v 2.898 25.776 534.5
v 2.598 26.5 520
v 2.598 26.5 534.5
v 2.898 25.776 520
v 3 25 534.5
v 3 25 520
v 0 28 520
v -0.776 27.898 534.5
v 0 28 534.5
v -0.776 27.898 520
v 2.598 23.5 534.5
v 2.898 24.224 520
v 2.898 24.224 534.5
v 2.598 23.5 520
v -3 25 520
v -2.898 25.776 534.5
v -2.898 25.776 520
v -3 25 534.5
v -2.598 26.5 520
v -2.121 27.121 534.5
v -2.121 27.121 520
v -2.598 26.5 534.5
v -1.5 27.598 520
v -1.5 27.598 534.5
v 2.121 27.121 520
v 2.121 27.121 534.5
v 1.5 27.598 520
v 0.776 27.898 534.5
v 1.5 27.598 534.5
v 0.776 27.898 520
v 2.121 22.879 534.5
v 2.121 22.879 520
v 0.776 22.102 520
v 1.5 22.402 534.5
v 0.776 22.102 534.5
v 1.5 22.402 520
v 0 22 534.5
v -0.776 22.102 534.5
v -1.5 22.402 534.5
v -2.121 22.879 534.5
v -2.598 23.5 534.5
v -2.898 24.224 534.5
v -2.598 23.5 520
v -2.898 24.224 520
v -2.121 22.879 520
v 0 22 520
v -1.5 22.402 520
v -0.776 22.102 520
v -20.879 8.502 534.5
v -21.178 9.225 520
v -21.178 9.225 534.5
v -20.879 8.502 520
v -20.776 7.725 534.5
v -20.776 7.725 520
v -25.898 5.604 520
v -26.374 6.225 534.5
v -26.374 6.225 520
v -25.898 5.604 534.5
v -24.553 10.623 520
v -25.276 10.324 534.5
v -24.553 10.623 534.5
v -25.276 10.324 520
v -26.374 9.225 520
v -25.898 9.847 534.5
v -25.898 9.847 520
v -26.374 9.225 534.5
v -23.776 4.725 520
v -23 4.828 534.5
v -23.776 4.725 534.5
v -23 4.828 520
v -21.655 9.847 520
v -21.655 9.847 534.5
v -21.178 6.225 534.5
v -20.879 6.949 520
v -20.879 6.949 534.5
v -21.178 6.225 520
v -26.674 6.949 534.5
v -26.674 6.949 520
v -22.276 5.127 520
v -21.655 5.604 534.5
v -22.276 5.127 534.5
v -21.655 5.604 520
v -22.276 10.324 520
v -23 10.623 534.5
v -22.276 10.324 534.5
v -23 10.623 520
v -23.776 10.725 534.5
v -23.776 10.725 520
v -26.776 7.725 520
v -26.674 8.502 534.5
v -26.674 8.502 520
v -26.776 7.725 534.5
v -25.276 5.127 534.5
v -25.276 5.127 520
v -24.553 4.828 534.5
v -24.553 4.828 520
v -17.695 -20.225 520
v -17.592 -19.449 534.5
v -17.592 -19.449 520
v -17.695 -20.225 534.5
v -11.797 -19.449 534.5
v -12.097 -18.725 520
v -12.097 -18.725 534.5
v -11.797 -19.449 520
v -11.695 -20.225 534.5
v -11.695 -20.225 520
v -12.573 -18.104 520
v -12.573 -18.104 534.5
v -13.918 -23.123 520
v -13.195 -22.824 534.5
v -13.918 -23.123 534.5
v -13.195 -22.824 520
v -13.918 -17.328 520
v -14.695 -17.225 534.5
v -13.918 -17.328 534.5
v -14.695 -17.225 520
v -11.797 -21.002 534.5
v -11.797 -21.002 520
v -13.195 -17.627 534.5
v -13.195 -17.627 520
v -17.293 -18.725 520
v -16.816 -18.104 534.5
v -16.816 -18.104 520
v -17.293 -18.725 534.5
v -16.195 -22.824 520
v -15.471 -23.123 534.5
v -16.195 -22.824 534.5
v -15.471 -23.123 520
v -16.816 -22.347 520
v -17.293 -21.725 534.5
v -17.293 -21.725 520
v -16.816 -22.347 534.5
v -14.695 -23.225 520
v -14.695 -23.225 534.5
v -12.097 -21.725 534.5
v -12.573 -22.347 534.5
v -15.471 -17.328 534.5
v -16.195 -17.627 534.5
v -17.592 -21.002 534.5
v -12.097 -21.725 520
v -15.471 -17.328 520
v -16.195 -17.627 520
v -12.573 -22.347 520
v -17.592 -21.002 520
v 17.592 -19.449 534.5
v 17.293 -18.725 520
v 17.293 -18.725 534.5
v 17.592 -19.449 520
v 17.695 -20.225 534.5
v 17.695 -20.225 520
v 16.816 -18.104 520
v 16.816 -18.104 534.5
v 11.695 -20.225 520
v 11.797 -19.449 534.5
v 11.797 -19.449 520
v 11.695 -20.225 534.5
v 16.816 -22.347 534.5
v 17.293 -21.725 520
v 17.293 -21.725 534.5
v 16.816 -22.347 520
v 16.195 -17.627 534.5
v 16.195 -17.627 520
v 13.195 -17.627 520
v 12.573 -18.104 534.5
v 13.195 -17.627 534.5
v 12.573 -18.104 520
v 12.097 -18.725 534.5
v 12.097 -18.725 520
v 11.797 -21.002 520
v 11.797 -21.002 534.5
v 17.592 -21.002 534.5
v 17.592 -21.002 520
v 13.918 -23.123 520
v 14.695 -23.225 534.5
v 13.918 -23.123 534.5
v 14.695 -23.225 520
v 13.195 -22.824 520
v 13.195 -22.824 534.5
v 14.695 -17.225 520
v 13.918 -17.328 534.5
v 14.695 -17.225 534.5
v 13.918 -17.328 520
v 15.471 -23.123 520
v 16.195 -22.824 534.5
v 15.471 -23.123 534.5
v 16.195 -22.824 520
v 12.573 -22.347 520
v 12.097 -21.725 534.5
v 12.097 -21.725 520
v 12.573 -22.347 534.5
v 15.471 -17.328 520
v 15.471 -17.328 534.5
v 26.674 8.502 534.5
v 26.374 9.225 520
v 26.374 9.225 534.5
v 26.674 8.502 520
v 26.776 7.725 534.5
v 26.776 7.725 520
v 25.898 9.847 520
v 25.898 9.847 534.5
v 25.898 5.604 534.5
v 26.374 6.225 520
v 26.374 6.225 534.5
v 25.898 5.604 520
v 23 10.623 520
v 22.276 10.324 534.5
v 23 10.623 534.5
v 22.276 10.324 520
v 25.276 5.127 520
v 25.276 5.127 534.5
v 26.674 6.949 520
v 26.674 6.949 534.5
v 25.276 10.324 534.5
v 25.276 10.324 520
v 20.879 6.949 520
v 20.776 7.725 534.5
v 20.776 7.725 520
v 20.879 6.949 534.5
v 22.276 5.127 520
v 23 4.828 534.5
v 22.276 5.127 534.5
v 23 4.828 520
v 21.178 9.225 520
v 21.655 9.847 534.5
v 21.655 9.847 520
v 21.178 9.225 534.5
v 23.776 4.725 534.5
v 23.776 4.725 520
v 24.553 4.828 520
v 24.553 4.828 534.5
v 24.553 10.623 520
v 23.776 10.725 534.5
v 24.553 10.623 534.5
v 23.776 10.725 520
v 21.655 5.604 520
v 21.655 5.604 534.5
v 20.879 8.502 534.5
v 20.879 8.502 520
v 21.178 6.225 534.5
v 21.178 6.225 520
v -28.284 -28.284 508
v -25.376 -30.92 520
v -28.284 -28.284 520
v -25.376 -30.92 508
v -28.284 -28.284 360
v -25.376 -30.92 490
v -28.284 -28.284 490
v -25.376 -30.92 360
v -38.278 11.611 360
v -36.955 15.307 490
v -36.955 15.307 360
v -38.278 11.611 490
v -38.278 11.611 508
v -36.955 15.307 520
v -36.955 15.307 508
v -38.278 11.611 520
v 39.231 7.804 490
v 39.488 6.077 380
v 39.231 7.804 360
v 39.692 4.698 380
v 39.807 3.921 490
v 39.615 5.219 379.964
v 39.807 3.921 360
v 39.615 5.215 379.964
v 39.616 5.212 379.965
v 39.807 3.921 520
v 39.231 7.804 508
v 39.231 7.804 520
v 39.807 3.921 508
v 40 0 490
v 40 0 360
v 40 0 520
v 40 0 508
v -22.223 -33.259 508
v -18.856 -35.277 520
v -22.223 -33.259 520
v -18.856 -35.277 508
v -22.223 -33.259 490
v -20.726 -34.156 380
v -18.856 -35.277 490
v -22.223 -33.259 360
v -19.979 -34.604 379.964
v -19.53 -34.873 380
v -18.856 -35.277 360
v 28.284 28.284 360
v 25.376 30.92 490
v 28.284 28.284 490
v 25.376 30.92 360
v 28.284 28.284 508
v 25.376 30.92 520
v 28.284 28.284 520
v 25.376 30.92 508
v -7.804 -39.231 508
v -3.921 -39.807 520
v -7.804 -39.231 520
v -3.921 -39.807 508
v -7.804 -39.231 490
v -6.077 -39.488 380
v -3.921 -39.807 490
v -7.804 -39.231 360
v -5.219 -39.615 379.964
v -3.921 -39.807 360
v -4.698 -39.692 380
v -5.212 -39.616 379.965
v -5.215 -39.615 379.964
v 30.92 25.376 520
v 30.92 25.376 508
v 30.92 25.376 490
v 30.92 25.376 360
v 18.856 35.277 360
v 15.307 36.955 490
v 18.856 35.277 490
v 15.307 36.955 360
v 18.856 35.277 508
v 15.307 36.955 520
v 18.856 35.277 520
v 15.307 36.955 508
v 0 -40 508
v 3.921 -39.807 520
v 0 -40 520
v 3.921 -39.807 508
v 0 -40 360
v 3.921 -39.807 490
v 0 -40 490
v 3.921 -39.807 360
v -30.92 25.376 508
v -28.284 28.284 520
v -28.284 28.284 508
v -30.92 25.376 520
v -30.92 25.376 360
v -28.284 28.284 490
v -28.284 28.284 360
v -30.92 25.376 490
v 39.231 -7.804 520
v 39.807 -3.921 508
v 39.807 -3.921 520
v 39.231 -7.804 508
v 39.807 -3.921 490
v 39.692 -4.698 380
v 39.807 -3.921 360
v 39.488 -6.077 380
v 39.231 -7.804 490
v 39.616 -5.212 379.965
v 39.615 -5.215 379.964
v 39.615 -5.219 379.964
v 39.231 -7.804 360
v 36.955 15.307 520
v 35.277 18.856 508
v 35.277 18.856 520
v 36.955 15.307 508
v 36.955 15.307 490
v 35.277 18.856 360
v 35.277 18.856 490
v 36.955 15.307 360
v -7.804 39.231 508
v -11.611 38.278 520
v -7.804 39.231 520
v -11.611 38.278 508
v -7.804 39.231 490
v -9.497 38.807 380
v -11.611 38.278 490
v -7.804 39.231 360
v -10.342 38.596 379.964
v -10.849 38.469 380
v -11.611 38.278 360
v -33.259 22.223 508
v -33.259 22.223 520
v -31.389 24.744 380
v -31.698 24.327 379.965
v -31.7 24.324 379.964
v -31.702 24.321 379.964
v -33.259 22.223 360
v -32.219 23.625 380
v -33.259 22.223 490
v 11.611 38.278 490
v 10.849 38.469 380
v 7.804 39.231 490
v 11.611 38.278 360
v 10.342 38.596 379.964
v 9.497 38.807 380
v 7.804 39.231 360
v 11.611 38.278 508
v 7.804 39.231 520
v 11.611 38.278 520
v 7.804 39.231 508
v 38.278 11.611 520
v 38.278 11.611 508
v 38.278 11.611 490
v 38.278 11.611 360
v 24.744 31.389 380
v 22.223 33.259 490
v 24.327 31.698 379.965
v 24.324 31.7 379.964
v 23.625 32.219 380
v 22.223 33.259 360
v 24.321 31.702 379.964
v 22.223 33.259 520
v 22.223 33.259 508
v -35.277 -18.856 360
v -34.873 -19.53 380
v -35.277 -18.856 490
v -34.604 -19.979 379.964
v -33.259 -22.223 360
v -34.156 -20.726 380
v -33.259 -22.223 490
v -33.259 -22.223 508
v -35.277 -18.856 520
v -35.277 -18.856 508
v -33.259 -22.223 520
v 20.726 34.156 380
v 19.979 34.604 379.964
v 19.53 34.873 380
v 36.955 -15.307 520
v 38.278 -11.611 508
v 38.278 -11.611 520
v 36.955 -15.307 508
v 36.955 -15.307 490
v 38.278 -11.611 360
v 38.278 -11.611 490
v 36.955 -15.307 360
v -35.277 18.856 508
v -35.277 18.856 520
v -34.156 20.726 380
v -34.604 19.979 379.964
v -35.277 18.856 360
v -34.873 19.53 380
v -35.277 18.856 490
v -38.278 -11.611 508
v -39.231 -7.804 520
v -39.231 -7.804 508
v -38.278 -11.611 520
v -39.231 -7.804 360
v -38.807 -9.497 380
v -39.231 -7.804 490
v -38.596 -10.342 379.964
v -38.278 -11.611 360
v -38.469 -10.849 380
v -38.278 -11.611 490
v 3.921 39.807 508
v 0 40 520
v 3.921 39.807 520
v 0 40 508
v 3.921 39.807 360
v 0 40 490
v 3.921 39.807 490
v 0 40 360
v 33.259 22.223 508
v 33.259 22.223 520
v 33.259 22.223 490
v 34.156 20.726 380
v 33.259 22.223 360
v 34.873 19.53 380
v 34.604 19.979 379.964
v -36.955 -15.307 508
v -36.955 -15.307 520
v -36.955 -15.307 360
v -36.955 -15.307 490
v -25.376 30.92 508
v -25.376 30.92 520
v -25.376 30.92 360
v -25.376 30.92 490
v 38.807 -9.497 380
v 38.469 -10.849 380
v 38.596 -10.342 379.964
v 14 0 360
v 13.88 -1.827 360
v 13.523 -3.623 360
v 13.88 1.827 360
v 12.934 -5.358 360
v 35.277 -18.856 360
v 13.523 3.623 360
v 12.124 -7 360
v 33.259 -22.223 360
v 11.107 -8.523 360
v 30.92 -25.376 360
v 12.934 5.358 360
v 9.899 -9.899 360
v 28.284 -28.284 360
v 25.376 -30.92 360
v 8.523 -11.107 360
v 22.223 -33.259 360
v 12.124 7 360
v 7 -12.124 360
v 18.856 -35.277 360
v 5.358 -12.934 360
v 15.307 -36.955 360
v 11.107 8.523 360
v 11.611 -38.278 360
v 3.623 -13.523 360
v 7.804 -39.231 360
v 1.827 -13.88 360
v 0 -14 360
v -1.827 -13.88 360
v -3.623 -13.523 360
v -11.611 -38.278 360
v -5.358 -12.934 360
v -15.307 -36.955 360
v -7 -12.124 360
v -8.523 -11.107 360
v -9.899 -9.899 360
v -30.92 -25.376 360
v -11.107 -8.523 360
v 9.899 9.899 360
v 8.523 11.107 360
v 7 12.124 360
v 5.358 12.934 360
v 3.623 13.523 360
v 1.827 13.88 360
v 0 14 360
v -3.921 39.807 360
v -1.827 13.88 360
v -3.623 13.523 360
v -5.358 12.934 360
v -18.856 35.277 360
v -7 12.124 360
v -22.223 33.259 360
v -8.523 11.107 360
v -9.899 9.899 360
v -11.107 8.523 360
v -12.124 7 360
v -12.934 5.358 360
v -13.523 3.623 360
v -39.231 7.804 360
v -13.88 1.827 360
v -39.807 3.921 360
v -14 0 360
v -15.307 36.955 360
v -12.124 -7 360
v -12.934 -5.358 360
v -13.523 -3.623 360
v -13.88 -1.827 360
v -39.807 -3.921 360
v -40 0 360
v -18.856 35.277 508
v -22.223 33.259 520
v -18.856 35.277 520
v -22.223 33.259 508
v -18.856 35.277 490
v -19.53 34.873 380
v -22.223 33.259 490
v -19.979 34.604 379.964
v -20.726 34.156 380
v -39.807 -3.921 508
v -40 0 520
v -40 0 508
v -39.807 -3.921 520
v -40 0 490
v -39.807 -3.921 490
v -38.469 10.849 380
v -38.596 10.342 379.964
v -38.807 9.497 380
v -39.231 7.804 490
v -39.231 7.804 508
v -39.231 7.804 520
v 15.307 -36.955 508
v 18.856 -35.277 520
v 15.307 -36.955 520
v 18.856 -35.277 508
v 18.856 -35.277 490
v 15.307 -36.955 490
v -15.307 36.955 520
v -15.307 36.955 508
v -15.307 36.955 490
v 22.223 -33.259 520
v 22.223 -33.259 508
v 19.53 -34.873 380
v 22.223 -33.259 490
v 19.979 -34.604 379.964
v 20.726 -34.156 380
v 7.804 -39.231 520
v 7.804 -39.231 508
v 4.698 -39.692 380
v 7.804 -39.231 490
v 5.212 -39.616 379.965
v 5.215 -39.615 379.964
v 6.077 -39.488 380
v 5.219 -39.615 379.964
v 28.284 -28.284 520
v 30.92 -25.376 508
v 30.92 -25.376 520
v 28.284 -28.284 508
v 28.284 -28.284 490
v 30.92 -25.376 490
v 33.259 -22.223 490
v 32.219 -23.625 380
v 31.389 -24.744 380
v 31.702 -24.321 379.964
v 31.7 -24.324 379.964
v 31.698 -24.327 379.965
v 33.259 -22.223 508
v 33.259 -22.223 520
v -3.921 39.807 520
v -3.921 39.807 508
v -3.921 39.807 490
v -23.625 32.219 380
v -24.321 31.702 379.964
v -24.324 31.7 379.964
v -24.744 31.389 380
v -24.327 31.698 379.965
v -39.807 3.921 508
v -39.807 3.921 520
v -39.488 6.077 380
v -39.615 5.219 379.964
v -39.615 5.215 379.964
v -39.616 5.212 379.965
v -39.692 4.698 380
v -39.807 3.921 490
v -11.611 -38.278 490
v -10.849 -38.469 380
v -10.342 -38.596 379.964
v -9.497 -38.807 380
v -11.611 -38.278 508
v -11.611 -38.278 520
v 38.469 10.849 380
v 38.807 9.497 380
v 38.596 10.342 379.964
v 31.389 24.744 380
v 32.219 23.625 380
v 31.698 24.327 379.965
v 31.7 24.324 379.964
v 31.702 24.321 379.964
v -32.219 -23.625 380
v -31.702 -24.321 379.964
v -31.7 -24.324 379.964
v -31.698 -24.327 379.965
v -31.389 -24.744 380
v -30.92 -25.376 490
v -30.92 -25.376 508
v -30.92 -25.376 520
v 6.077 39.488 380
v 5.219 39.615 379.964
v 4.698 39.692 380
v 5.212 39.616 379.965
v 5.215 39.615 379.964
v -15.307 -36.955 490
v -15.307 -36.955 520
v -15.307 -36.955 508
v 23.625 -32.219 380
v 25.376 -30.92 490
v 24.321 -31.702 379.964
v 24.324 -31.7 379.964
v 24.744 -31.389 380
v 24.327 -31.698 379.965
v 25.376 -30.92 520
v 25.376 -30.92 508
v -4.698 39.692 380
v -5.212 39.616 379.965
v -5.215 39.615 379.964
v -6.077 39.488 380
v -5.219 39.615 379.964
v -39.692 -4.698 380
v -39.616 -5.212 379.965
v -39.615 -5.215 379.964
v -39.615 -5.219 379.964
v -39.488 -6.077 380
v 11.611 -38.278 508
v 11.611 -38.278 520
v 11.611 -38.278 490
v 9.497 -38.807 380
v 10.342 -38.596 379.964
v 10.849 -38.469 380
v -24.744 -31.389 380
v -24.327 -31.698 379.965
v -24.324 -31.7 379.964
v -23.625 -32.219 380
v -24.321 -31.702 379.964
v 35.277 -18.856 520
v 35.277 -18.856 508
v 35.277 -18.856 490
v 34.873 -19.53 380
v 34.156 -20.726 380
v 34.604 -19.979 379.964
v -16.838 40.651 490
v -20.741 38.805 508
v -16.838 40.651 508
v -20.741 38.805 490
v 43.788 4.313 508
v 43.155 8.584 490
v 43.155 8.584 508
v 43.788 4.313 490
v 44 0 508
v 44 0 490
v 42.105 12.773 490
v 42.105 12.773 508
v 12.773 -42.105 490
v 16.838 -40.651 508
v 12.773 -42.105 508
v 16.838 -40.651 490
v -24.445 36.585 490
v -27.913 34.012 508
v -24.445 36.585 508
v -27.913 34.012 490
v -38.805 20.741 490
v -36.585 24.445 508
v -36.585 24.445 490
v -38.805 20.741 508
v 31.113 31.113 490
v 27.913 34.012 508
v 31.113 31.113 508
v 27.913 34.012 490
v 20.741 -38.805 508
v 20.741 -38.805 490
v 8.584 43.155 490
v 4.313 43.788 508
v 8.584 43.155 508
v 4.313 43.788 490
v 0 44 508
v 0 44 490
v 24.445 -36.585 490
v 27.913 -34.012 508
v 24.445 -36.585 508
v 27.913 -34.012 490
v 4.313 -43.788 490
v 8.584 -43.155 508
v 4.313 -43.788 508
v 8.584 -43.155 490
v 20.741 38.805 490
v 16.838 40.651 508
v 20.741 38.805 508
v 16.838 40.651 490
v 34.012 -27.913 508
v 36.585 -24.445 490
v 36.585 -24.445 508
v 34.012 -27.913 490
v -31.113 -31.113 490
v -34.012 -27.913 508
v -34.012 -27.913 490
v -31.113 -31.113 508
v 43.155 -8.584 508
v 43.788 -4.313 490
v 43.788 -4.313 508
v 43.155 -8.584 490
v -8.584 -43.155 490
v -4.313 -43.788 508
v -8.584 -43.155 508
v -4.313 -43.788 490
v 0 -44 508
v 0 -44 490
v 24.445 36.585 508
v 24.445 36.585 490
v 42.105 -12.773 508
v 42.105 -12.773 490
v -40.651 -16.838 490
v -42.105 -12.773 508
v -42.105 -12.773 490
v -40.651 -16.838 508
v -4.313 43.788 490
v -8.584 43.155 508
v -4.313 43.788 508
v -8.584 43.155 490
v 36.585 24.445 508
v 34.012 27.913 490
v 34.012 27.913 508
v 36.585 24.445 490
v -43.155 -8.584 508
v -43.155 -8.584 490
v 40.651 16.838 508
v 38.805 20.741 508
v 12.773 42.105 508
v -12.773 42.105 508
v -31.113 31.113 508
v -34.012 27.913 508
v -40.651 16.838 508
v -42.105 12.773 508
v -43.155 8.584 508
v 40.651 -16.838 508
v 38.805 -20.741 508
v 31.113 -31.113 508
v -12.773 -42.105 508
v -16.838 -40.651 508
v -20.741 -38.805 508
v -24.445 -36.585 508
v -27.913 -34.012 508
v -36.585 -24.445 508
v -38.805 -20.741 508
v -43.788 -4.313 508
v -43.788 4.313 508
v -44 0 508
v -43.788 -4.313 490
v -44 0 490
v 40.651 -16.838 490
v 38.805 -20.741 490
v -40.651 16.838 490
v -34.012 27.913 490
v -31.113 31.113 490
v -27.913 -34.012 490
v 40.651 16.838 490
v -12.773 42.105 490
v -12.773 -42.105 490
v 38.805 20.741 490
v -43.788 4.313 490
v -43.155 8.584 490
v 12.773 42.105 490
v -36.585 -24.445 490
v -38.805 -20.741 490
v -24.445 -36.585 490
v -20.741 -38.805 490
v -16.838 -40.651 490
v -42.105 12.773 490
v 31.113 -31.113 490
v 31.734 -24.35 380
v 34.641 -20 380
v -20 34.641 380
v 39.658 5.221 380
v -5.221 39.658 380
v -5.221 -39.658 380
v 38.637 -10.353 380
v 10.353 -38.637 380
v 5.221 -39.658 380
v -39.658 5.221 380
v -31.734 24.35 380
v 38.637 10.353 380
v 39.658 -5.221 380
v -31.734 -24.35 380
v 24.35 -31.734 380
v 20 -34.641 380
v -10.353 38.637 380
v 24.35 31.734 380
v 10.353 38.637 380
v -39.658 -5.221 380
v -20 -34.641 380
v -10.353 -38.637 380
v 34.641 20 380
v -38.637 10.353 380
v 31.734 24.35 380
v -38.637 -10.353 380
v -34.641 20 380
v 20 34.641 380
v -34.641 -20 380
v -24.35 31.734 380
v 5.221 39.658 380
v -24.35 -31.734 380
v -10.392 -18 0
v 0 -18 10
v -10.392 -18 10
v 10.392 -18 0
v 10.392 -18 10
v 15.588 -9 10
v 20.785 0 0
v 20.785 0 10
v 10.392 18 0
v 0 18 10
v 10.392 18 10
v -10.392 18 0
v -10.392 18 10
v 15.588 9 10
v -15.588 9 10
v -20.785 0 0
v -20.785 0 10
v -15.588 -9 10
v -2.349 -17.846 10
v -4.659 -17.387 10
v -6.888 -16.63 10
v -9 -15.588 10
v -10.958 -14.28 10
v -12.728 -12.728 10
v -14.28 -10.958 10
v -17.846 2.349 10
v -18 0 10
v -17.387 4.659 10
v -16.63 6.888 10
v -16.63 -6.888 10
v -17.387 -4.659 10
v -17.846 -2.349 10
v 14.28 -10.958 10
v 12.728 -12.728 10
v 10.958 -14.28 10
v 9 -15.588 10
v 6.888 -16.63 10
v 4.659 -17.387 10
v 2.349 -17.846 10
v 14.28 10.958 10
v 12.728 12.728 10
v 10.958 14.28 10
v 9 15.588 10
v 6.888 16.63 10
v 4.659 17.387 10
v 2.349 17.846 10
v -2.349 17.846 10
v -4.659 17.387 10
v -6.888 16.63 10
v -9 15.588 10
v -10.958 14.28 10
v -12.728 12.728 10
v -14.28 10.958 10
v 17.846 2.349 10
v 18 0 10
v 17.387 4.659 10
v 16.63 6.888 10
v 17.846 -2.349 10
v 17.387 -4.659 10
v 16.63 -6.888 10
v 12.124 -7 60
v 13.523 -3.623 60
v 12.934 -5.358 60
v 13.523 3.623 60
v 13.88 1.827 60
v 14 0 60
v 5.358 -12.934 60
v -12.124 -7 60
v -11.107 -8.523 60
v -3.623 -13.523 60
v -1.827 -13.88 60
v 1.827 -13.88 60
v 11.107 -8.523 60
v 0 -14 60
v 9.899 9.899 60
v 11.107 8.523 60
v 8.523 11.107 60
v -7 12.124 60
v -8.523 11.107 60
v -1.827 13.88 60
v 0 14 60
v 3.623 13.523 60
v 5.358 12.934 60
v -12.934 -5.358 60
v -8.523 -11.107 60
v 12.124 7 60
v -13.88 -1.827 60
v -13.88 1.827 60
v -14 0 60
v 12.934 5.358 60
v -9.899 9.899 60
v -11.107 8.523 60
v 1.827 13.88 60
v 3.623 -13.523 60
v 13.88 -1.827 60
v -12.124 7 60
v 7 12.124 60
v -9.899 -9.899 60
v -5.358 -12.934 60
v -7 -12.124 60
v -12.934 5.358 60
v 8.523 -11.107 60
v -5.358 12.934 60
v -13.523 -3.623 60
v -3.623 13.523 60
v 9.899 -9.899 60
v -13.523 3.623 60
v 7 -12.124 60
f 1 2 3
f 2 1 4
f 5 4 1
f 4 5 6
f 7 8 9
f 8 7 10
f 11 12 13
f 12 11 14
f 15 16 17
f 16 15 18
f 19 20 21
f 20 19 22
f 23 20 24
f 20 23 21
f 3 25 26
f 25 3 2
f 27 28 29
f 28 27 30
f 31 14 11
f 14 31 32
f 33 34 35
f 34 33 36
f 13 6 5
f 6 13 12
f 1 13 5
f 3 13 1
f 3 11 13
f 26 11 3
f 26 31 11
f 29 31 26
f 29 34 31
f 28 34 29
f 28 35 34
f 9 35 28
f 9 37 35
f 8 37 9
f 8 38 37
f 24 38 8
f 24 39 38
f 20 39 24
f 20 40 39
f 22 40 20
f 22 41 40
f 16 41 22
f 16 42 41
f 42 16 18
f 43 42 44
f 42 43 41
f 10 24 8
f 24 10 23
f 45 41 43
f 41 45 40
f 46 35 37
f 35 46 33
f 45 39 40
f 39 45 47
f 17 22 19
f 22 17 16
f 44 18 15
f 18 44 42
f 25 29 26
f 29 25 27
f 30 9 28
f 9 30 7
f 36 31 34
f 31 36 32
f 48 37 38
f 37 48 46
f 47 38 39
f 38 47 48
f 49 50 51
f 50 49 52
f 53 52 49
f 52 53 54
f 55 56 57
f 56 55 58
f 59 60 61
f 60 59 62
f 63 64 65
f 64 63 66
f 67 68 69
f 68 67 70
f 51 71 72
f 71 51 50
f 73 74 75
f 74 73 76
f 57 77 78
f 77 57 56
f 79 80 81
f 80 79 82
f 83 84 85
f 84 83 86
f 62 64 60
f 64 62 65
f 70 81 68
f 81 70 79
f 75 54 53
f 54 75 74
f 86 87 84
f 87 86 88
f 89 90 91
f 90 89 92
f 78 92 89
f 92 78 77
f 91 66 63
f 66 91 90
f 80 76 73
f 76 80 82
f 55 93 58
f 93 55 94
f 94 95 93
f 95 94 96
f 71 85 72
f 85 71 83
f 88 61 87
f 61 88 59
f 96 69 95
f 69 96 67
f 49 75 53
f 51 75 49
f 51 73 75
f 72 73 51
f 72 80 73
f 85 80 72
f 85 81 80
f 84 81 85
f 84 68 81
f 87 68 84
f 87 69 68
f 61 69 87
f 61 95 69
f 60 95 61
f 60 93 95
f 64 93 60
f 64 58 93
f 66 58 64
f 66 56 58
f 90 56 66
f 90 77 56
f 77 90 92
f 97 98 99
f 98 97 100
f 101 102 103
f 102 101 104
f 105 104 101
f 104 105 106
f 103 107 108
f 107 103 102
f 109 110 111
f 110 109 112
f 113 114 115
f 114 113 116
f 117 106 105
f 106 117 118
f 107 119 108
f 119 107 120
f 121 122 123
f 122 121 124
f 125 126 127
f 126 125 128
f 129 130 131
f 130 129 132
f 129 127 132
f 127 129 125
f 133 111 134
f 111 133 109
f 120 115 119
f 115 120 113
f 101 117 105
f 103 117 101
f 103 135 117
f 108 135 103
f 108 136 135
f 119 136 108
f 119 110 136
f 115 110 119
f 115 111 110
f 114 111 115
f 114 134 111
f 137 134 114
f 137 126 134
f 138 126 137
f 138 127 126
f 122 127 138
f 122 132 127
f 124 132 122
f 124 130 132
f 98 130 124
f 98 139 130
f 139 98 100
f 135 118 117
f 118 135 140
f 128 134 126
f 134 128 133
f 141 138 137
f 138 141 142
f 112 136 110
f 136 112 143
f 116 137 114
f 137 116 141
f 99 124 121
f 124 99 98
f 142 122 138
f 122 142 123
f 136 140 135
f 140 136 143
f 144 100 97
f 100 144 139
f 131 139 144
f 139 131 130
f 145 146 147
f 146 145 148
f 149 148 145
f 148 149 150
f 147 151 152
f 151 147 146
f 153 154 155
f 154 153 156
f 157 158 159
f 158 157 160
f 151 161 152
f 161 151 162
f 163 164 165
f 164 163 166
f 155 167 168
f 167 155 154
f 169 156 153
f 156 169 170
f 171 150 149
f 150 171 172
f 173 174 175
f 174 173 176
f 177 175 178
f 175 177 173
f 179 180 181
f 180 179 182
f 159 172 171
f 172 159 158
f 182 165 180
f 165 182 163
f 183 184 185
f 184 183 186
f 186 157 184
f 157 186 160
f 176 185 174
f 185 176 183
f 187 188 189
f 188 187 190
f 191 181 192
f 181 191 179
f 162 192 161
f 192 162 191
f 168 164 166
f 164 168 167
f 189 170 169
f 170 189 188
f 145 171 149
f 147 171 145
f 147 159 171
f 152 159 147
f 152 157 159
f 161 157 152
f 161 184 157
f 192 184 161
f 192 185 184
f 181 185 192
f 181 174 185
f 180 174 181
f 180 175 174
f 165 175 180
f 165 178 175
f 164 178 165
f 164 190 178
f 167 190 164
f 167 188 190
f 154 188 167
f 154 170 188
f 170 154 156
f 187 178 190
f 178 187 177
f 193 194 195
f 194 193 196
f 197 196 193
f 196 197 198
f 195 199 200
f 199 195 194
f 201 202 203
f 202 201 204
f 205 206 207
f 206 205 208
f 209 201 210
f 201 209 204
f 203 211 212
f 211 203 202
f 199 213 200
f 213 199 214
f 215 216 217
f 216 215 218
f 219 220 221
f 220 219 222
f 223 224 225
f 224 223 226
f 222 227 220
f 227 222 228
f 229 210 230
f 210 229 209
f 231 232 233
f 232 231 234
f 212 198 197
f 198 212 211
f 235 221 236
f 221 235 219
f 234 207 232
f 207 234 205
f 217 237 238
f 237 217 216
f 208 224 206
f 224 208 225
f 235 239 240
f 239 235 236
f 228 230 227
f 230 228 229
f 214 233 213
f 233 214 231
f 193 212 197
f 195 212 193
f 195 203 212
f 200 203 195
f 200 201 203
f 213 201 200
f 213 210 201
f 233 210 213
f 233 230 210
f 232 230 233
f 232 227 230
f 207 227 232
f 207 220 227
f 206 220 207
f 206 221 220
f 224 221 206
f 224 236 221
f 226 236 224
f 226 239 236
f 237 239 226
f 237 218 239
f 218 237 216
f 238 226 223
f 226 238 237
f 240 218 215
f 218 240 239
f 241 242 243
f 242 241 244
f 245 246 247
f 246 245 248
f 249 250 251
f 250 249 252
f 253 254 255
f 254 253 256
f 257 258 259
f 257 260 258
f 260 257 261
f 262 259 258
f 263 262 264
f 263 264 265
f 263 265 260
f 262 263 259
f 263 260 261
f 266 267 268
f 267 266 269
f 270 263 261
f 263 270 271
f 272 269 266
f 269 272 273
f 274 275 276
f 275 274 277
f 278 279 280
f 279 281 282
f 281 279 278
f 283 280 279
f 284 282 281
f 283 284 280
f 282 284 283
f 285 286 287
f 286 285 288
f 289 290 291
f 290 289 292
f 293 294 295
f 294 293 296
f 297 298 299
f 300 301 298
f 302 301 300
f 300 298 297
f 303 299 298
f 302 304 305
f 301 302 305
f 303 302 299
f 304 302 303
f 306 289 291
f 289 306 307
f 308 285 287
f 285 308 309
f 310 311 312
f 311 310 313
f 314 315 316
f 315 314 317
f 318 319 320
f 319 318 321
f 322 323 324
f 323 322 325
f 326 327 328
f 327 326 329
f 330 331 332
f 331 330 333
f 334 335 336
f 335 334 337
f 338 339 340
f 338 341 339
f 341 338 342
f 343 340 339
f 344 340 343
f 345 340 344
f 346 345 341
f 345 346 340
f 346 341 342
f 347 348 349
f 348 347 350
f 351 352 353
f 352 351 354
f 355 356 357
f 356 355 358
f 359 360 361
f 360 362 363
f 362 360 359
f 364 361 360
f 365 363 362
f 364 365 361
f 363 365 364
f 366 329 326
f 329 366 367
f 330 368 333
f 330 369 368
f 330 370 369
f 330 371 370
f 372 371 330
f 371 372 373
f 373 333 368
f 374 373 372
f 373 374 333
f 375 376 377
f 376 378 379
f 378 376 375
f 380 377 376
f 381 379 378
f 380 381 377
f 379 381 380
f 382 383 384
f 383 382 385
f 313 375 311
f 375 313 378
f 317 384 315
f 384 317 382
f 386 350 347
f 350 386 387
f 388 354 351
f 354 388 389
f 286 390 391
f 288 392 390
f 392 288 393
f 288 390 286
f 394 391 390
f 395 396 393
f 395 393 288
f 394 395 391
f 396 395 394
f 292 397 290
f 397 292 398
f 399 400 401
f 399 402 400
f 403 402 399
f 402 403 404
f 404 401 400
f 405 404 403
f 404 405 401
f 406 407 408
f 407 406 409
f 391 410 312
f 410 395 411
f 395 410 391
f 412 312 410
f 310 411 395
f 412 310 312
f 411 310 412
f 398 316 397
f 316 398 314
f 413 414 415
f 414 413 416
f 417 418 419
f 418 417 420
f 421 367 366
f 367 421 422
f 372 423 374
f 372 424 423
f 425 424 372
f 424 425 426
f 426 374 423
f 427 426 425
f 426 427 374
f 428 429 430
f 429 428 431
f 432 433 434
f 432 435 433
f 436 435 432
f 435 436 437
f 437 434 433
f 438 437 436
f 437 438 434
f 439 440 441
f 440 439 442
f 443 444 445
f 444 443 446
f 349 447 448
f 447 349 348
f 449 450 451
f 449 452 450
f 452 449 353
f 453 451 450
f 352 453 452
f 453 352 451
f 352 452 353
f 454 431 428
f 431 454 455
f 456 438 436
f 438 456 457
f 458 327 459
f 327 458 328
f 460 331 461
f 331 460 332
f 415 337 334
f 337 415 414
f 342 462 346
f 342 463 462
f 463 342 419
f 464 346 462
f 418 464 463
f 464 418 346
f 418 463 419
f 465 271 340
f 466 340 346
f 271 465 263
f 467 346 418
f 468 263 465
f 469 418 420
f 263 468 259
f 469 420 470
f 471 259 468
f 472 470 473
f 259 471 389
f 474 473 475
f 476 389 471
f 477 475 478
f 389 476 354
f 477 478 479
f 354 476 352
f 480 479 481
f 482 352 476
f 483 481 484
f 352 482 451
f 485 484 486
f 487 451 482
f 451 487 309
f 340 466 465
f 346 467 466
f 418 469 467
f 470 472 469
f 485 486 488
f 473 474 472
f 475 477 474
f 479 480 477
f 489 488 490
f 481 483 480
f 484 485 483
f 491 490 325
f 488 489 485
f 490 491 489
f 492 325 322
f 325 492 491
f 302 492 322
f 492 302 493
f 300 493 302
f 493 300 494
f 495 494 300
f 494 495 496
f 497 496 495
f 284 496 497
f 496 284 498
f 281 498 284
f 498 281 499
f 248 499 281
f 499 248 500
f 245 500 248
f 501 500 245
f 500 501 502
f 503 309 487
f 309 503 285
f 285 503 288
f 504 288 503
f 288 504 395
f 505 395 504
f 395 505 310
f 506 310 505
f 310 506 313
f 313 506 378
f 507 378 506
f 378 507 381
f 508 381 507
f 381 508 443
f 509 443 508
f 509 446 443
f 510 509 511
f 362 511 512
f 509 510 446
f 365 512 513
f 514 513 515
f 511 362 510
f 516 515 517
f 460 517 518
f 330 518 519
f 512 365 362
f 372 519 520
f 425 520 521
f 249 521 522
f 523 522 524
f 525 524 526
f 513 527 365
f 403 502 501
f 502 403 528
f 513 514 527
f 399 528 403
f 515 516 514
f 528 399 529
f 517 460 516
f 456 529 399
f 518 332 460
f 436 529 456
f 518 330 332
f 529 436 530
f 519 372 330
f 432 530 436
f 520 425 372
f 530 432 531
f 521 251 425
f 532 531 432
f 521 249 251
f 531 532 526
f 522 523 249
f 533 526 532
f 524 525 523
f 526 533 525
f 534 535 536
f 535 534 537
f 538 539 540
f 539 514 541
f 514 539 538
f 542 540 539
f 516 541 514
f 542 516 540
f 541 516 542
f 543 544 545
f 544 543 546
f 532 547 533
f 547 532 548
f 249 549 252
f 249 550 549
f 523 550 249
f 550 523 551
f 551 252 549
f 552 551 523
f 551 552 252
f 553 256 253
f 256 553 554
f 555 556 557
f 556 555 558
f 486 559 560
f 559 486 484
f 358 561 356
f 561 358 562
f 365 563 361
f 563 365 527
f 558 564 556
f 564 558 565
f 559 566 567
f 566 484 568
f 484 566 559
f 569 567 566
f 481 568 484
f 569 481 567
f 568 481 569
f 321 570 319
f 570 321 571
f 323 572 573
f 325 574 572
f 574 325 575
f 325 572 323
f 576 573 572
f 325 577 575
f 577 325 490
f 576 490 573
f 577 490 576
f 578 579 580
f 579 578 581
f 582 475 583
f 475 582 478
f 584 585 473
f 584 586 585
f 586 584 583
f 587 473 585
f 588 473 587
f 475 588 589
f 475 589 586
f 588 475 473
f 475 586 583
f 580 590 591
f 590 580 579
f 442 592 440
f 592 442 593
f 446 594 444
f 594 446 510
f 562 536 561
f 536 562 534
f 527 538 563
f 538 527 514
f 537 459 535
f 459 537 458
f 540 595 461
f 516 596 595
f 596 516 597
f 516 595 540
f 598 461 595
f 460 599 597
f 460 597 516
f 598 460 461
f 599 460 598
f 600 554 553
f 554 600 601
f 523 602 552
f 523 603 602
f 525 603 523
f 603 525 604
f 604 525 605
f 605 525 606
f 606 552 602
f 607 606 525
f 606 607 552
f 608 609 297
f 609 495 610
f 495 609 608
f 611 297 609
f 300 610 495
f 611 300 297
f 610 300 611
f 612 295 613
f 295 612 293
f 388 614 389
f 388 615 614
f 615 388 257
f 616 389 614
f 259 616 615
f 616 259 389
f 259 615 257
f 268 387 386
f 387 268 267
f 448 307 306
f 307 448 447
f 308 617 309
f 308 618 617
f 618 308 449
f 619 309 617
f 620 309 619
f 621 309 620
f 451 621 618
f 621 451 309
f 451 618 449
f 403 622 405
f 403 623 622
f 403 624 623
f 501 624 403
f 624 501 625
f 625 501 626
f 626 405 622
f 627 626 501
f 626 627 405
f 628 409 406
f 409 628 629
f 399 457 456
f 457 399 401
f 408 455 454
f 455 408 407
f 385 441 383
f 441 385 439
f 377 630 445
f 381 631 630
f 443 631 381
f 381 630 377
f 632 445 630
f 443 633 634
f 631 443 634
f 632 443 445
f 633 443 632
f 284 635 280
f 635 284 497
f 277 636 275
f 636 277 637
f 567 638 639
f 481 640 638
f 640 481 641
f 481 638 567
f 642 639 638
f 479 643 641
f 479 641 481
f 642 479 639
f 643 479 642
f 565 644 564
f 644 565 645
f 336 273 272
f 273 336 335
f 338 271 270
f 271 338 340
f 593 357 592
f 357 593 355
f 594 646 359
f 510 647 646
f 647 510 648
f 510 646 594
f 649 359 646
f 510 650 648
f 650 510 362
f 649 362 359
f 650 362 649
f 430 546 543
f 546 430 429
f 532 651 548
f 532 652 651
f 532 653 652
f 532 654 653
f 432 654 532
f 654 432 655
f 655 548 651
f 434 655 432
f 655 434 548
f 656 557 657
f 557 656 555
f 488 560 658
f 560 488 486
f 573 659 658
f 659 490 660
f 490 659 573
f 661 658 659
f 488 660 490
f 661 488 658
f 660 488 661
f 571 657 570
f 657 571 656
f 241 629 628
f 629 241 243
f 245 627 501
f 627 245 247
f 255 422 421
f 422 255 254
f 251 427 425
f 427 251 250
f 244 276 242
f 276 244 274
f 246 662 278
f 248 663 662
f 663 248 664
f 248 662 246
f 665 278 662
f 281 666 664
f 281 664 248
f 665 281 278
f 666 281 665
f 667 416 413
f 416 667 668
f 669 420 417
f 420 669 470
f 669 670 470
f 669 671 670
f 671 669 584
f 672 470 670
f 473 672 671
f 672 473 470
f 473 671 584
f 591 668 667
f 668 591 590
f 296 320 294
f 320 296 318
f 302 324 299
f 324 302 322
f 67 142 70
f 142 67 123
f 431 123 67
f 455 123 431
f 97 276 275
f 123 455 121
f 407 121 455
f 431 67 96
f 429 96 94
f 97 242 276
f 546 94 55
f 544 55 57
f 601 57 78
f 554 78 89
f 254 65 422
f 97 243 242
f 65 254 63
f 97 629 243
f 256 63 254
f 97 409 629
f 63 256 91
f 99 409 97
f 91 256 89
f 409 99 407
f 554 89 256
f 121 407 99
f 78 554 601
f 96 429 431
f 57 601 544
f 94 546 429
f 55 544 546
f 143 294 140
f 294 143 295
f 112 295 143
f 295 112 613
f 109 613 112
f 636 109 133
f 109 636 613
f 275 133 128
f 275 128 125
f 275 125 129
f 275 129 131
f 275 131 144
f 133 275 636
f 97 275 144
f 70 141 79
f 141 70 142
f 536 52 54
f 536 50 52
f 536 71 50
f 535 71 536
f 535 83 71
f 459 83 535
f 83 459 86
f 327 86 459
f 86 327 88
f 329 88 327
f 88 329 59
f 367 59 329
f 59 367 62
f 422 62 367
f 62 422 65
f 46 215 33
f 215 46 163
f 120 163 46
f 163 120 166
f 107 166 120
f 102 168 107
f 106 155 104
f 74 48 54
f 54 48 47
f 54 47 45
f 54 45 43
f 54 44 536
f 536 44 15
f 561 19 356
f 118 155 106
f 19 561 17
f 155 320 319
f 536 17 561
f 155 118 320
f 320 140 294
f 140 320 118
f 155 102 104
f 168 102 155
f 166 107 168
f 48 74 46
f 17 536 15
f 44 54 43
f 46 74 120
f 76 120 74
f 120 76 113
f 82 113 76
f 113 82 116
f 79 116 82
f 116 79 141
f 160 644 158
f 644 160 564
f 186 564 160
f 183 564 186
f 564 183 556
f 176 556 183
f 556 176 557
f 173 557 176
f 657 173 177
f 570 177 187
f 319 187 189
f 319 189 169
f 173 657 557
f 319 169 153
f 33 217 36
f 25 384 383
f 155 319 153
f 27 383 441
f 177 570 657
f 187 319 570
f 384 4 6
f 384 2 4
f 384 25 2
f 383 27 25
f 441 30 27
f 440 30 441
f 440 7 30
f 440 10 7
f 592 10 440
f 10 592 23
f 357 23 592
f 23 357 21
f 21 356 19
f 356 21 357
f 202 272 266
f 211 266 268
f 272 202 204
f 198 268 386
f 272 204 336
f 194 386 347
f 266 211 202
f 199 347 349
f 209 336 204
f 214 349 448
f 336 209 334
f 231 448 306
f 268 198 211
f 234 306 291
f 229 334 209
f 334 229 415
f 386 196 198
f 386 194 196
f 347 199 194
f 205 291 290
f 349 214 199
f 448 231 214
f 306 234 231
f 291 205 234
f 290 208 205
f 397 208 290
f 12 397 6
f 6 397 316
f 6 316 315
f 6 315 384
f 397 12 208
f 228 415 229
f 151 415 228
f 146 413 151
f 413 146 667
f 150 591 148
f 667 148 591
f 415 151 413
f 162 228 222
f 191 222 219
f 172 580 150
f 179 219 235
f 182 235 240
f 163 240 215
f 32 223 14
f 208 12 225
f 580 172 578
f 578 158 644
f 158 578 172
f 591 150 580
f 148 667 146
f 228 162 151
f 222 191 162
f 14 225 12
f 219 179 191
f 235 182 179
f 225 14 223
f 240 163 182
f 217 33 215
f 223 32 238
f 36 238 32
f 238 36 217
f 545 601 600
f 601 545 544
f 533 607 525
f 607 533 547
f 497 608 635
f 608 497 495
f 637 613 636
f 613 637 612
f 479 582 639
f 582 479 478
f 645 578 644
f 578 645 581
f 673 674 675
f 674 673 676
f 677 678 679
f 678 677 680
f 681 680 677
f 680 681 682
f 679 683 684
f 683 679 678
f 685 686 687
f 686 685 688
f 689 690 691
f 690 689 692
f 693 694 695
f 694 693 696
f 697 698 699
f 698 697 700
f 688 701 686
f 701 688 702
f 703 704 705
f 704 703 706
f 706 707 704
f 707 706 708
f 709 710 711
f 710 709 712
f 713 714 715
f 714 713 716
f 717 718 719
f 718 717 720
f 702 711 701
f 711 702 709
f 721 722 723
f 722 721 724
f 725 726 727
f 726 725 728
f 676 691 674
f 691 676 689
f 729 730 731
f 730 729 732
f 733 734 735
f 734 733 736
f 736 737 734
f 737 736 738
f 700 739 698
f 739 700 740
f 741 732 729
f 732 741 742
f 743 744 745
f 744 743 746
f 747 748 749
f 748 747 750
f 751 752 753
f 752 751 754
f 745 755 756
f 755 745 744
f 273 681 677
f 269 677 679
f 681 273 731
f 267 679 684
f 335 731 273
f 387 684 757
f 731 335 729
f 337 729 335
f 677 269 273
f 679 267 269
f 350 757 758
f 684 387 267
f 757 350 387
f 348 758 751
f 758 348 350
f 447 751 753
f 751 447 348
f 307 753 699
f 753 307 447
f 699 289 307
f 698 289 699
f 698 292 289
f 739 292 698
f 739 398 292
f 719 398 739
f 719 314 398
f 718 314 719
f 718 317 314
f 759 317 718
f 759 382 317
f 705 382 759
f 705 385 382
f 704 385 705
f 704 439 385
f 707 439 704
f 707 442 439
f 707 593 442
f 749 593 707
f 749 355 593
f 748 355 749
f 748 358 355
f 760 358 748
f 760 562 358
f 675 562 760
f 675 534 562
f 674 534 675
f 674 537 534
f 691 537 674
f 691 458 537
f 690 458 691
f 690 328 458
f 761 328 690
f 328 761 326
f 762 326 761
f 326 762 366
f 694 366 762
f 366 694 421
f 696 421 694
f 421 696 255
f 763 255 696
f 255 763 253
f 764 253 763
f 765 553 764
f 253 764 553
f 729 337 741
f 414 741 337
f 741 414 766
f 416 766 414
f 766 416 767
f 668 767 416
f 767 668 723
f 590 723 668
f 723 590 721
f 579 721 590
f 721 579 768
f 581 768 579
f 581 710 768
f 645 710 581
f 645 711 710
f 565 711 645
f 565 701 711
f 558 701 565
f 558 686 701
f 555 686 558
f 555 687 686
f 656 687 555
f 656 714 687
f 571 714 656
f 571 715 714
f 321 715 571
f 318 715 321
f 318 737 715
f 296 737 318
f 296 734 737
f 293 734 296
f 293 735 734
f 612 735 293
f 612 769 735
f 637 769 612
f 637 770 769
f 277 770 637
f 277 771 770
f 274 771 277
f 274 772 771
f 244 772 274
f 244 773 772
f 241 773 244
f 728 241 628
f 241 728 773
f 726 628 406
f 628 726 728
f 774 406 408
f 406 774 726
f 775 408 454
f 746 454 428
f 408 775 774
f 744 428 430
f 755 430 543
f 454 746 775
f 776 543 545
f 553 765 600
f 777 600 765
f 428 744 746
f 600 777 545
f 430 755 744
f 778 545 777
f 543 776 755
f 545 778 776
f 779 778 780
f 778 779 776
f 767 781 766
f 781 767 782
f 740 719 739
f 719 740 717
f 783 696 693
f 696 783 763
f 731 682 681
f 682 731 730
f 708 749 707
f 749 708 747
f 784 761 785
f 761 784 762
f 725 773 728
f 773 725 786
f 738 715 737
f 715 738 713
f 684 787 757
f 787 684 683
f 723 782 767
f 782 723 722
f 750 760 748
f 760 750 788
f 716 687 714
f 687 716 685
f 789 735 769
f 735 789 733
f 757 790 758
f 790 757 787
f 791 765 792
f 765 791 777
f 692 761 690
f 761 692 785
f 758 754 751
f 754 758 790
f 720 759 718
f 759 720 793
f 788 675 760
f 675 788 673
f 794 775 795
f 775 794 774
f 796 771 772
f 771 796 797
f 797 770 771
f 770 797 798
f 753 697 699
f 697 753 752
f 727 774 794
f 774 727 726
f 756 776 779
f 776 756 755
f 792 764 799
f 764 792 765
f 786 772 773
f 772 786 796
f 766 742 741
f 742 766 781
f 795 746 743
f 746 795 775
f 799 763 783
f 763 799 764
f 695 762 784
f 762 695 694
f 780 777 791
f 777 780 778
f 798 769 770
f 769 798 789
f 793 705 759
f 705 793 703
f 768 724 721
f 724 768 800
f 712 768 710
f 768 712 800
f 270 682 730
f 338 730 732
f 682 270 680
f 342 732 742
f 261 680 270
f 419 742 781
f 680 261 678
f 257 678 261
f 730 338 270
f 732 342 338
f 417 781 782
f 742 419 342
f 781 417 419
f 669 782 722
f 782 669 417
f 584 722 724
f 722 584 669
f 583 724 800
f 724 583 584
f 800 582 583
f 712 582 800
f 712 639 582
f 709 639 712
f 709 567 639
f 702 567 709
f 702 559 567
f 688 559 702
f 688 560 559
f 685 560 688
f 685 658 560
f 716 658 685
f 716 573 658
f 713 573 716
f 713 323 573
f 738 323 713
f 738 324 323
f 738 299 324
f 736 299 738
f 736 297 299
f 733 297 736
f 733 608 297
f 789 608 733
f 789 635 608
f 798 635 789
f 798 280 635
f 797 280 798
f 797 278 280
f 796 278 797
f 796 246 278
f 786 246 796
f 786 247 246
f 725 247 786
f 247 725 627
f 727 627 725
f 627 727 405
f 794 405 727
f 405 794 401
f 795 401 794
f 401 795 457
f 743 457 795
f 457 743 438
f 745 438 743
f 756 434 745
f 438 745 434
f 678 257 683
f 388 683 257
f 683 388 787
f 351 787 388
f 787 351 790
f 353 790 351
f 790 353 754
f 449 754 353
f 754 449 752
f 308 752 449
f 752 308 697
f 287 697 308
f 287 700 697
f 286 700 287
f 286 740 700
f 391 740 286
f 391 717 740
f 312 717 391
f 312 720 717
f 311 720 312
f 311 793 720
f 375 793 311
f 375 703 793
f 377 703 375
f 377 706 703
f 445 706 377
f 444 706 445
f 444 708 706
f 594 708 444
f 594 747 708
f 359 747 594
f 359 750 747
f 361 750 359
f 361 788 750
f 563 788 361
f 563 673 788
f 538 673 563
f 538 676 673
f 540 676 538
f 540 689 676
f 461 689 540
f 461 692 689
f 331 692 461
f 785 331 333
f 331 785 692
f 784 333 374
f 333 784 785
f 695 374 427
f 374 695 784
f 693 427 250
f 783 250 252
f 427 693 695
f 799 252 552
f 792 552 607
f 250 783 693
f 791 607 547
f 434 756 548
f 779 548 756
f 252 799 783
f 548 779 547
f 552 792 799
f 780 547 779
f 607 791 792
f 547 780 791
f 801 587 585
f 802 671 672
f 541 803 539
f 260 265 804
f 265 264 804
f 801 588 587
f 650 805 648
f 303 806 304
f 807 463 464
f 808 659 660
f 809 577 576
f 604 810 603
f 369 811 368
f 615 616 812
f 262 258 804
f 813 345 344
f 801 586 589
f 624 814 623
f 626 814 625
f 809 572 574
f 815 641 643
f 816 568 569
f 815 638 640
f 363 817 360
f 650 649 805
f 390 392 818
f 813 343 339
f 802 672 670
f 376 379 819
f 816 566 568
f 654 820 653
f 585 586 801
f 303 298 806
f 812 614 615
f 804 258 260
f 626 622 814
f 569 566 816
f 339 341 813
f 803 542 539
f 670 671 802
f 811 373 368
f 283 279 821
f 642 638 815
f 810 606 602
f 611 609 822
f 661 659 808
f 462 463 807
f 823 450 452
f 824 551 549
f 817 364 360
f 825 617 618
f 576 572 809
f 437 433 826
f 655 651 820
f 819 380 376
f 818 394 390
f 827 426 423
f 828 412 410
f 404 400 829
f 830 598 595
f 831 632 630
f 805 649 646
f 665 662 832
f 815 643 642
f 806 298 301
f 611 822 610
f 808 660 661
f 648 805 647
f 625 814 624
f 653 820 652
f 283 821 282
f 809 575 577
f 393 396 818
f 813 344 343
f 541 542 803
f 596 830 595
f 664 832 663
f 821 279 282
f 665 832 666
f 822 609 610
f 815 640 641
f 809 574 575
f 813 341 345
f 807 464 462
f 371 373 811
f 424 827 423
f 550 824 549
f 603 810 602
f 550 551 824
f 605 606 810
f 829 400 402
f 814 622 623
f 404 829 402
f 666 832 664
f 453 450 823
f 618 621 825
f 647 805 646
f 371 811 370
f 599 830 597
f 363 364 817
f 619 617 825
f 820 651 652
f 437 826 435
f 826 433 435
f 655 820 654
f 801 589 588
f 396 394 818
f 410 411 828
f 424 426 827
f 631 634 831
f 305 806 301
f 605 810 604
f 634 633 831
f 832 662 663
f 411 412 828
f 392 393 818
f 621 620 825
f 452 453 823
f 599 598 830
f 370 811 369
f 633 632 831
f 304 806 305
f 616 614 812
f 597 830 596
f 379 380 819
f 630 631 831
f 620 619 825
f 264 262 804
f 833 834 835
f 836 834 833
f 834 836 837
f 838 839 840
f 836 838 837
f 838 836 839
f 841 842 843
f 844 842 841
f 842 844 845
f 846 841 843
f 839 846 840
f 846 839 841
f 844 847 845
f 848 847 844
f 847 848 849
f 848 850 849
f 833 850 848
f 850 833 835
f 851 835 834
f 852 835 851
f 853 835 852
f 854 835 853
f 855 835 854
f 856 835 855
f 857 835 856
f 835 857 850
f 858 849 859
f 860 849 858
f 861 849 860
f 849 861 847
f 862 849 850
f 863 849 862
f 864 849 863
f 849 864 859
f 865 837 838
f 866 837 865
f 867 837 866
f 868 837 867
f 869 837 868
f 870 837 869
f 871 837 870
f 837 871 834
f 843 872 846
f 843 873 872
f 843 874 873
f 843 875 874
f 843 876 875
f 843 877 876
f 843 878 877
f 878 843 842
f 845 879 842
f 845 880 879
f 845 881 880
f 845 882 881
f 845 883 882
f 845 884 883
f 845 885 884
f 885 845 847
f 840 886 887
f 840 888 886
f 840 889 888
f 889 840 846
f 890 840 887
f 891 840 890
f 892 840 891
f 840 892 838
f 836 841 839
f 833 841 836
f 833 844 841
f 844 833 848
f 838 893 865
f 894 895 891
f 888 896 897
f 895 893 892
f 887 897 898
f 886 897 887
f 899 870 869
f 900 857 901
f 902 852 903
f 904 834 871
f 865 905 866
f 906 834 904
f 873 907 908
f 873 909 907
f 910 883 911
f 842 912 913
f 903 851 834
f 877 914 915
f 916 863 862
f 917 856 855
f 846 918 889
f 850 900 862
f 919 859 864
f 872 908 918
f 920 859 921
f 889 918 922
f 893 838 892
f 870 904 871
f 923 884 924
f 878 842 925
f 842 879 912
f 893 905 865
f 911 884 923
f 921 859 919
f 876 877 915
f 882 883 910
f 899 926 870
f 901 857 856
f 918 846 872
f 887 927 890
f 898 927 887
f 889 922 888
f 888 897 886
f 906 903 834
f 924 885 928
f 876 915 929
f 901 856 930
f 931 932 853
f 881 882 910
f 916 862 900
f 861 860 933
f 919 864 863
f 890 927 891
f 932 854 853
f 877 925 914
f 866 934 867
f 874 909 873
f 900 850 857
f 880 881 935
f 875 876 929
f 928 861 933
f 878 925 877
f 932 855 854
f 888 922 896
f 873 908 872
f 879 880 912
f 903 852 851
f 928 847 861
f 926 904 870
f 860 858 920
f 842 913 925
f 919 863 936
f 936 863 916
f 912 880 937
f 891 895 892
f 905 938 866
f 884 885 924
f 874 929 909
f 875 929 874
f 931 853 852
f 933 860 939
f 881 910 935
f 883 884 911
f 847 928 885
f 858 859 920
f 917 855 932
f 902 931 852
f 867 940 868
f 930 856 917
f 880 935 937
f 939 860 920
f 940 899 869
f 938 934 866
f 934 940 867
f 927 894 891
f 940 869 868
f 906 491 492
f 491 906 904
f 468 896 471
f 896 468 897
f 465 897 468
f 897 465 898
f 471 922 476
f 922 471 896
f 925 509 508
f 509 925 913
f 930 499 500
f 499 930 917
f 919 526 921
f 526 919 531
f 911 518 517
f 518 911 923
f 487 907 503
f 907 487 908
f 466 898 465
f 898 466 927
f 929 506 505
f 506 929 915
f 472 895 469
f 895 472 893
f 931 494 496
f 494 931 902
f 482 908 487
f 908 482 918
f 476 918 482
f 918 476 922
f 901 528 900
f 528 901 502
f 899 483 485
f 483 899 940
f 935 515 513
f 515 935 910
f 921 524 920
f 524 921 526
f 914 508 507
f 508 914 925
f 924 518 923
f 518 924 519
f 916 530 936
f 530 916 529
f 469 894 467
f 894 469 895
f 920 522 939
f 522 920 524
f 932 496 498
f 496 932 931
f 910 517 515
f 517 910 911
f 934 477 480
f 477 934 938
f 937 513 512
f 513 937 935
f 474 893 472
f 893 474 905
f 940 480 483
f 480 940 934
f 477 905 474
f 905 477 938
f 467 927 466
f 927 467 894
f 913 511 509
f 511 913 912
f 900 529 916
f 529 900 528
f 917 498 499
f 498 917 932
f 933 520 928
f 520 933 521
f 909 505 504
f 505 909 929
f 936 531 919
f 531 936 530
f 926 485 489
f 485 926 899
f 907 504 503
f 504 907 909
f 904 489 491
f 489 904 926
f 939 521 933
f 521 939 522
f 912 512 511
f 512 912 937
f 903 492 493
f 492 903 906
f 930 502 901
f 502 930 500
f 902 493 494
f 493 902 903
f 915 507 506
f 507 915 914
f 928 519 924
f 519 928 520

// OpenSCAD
// =====================================================================
// sub_top_whip_cord.scad
// APC NetShelter Rack PDU Advanced 100A (APDU11590SM)
// Cable gland top entry, kabel fleksibel Ø28 mm, plug IEC 60309 100A
// 415V 3P+N+PE (merah). Origin: bidang top cap, sumbu +Z ke atas.
// =====================================================================

$fn = 32;

GLAND_HEX_AF = 36.0;    // gland nut hex across-flats
GLAND_H = 10.0;
BOOT_D_BOT = 36.0;      // strain-relief boot mengerucut 36 -> 28
BOOT_D_TOP = 28.0;
BOOT_H = 50.0;
CORD_DIA = 28.0;        // jacket 5-wire 100A 415V
CORD_LEN_NOMINAL = 1800.0;

// Plug IEC 60309 100A
PLUG_DIA = 80.0;        // diameter barrel
PLUG_LEN = 160.0;       // panjang badan
PLUG_RING_DIA = 88.0;   // locking ring pengunci putar
PLUG_RING_H = 18.0;
PLUG_PIN_DIA = 6.0;
PLUG_PIN_H = 15.0;
PLUG_PIN_R = 25.0;      // radius pola 5 pin (3P+N+PE)

RAL3001_RED = [0.65, 0.10, 0.12];

module sub_top_whip_cord(cord_len = 300) {
    // ---- Gland nut (hex) menumpang di top cap ----
    color([0.15, 0.15, 0.16])
        cylinder(d = GLAND_HEX_AF / cos(30), h = GLAND_H, $fn = 6);

    // ---- Rubber strain-relief boot (taper 36 -> 28) ----
    color([0.05, 0.05, 0.055])
        translate([0, 0, GLAND_H])
            cylinder(d1 = BOOT_D_BOT, d2 = BOOT_D_TOP, h = BOOT_H, $fn = 48);

    // ---- Kabel fleksibel Ø28 ----
    color([0.04, 0.04, 0.045])
        translate([0, 0, GLAND_H + BOOT_H])
            cylinder(d = CORD_DIA, h = cord_len, $fn = 48);

    z_plug = GLAND_H + BOOT_H + cord_len;

    // ---- Plug IEC 60309 100A (merah, 415V 3P+N+PE) ----
    translate([0, 0, z_plug]) {
        // badan barrel
        color(RAL3001_RED)
            cylinder(d = PLUG_DIA, h = PLUG_LEN, $fn = 64);
        // locking ring pengunci putar
        color([0.45, 0.07, 0.09])
            translate([0, 0, PLUG_LEN - PLUG_RING_H - 12])
                cylinder(d = PLUG_RING_DIA, h = PLUG_RING_H, $fn = 64);
        // kerah kabel di pangkal plug
        color([0.45, 0.07, 0.09])
            cylinder(d1 = CORD_DIA + 4, d2 = PLUG_DIA, h = 20, $fn = 48);
        // 5 round contact pins (3P+N+PE) di muka plug
        color([0.72, 0.72, 0.74])
            for (a = [90, 162, 234, 306, 18])
                translate([PLUG_PIN_R * cos(a), PLUG_PIN_R * sin(a), PLUG_LEN - 0.5])
                    cylinder(d = PLUG_PIN_DIA, h = PLUG_PIN_H, $fn = 24);
    }
}

// Preview standalone
sub_top_whip_cord();
